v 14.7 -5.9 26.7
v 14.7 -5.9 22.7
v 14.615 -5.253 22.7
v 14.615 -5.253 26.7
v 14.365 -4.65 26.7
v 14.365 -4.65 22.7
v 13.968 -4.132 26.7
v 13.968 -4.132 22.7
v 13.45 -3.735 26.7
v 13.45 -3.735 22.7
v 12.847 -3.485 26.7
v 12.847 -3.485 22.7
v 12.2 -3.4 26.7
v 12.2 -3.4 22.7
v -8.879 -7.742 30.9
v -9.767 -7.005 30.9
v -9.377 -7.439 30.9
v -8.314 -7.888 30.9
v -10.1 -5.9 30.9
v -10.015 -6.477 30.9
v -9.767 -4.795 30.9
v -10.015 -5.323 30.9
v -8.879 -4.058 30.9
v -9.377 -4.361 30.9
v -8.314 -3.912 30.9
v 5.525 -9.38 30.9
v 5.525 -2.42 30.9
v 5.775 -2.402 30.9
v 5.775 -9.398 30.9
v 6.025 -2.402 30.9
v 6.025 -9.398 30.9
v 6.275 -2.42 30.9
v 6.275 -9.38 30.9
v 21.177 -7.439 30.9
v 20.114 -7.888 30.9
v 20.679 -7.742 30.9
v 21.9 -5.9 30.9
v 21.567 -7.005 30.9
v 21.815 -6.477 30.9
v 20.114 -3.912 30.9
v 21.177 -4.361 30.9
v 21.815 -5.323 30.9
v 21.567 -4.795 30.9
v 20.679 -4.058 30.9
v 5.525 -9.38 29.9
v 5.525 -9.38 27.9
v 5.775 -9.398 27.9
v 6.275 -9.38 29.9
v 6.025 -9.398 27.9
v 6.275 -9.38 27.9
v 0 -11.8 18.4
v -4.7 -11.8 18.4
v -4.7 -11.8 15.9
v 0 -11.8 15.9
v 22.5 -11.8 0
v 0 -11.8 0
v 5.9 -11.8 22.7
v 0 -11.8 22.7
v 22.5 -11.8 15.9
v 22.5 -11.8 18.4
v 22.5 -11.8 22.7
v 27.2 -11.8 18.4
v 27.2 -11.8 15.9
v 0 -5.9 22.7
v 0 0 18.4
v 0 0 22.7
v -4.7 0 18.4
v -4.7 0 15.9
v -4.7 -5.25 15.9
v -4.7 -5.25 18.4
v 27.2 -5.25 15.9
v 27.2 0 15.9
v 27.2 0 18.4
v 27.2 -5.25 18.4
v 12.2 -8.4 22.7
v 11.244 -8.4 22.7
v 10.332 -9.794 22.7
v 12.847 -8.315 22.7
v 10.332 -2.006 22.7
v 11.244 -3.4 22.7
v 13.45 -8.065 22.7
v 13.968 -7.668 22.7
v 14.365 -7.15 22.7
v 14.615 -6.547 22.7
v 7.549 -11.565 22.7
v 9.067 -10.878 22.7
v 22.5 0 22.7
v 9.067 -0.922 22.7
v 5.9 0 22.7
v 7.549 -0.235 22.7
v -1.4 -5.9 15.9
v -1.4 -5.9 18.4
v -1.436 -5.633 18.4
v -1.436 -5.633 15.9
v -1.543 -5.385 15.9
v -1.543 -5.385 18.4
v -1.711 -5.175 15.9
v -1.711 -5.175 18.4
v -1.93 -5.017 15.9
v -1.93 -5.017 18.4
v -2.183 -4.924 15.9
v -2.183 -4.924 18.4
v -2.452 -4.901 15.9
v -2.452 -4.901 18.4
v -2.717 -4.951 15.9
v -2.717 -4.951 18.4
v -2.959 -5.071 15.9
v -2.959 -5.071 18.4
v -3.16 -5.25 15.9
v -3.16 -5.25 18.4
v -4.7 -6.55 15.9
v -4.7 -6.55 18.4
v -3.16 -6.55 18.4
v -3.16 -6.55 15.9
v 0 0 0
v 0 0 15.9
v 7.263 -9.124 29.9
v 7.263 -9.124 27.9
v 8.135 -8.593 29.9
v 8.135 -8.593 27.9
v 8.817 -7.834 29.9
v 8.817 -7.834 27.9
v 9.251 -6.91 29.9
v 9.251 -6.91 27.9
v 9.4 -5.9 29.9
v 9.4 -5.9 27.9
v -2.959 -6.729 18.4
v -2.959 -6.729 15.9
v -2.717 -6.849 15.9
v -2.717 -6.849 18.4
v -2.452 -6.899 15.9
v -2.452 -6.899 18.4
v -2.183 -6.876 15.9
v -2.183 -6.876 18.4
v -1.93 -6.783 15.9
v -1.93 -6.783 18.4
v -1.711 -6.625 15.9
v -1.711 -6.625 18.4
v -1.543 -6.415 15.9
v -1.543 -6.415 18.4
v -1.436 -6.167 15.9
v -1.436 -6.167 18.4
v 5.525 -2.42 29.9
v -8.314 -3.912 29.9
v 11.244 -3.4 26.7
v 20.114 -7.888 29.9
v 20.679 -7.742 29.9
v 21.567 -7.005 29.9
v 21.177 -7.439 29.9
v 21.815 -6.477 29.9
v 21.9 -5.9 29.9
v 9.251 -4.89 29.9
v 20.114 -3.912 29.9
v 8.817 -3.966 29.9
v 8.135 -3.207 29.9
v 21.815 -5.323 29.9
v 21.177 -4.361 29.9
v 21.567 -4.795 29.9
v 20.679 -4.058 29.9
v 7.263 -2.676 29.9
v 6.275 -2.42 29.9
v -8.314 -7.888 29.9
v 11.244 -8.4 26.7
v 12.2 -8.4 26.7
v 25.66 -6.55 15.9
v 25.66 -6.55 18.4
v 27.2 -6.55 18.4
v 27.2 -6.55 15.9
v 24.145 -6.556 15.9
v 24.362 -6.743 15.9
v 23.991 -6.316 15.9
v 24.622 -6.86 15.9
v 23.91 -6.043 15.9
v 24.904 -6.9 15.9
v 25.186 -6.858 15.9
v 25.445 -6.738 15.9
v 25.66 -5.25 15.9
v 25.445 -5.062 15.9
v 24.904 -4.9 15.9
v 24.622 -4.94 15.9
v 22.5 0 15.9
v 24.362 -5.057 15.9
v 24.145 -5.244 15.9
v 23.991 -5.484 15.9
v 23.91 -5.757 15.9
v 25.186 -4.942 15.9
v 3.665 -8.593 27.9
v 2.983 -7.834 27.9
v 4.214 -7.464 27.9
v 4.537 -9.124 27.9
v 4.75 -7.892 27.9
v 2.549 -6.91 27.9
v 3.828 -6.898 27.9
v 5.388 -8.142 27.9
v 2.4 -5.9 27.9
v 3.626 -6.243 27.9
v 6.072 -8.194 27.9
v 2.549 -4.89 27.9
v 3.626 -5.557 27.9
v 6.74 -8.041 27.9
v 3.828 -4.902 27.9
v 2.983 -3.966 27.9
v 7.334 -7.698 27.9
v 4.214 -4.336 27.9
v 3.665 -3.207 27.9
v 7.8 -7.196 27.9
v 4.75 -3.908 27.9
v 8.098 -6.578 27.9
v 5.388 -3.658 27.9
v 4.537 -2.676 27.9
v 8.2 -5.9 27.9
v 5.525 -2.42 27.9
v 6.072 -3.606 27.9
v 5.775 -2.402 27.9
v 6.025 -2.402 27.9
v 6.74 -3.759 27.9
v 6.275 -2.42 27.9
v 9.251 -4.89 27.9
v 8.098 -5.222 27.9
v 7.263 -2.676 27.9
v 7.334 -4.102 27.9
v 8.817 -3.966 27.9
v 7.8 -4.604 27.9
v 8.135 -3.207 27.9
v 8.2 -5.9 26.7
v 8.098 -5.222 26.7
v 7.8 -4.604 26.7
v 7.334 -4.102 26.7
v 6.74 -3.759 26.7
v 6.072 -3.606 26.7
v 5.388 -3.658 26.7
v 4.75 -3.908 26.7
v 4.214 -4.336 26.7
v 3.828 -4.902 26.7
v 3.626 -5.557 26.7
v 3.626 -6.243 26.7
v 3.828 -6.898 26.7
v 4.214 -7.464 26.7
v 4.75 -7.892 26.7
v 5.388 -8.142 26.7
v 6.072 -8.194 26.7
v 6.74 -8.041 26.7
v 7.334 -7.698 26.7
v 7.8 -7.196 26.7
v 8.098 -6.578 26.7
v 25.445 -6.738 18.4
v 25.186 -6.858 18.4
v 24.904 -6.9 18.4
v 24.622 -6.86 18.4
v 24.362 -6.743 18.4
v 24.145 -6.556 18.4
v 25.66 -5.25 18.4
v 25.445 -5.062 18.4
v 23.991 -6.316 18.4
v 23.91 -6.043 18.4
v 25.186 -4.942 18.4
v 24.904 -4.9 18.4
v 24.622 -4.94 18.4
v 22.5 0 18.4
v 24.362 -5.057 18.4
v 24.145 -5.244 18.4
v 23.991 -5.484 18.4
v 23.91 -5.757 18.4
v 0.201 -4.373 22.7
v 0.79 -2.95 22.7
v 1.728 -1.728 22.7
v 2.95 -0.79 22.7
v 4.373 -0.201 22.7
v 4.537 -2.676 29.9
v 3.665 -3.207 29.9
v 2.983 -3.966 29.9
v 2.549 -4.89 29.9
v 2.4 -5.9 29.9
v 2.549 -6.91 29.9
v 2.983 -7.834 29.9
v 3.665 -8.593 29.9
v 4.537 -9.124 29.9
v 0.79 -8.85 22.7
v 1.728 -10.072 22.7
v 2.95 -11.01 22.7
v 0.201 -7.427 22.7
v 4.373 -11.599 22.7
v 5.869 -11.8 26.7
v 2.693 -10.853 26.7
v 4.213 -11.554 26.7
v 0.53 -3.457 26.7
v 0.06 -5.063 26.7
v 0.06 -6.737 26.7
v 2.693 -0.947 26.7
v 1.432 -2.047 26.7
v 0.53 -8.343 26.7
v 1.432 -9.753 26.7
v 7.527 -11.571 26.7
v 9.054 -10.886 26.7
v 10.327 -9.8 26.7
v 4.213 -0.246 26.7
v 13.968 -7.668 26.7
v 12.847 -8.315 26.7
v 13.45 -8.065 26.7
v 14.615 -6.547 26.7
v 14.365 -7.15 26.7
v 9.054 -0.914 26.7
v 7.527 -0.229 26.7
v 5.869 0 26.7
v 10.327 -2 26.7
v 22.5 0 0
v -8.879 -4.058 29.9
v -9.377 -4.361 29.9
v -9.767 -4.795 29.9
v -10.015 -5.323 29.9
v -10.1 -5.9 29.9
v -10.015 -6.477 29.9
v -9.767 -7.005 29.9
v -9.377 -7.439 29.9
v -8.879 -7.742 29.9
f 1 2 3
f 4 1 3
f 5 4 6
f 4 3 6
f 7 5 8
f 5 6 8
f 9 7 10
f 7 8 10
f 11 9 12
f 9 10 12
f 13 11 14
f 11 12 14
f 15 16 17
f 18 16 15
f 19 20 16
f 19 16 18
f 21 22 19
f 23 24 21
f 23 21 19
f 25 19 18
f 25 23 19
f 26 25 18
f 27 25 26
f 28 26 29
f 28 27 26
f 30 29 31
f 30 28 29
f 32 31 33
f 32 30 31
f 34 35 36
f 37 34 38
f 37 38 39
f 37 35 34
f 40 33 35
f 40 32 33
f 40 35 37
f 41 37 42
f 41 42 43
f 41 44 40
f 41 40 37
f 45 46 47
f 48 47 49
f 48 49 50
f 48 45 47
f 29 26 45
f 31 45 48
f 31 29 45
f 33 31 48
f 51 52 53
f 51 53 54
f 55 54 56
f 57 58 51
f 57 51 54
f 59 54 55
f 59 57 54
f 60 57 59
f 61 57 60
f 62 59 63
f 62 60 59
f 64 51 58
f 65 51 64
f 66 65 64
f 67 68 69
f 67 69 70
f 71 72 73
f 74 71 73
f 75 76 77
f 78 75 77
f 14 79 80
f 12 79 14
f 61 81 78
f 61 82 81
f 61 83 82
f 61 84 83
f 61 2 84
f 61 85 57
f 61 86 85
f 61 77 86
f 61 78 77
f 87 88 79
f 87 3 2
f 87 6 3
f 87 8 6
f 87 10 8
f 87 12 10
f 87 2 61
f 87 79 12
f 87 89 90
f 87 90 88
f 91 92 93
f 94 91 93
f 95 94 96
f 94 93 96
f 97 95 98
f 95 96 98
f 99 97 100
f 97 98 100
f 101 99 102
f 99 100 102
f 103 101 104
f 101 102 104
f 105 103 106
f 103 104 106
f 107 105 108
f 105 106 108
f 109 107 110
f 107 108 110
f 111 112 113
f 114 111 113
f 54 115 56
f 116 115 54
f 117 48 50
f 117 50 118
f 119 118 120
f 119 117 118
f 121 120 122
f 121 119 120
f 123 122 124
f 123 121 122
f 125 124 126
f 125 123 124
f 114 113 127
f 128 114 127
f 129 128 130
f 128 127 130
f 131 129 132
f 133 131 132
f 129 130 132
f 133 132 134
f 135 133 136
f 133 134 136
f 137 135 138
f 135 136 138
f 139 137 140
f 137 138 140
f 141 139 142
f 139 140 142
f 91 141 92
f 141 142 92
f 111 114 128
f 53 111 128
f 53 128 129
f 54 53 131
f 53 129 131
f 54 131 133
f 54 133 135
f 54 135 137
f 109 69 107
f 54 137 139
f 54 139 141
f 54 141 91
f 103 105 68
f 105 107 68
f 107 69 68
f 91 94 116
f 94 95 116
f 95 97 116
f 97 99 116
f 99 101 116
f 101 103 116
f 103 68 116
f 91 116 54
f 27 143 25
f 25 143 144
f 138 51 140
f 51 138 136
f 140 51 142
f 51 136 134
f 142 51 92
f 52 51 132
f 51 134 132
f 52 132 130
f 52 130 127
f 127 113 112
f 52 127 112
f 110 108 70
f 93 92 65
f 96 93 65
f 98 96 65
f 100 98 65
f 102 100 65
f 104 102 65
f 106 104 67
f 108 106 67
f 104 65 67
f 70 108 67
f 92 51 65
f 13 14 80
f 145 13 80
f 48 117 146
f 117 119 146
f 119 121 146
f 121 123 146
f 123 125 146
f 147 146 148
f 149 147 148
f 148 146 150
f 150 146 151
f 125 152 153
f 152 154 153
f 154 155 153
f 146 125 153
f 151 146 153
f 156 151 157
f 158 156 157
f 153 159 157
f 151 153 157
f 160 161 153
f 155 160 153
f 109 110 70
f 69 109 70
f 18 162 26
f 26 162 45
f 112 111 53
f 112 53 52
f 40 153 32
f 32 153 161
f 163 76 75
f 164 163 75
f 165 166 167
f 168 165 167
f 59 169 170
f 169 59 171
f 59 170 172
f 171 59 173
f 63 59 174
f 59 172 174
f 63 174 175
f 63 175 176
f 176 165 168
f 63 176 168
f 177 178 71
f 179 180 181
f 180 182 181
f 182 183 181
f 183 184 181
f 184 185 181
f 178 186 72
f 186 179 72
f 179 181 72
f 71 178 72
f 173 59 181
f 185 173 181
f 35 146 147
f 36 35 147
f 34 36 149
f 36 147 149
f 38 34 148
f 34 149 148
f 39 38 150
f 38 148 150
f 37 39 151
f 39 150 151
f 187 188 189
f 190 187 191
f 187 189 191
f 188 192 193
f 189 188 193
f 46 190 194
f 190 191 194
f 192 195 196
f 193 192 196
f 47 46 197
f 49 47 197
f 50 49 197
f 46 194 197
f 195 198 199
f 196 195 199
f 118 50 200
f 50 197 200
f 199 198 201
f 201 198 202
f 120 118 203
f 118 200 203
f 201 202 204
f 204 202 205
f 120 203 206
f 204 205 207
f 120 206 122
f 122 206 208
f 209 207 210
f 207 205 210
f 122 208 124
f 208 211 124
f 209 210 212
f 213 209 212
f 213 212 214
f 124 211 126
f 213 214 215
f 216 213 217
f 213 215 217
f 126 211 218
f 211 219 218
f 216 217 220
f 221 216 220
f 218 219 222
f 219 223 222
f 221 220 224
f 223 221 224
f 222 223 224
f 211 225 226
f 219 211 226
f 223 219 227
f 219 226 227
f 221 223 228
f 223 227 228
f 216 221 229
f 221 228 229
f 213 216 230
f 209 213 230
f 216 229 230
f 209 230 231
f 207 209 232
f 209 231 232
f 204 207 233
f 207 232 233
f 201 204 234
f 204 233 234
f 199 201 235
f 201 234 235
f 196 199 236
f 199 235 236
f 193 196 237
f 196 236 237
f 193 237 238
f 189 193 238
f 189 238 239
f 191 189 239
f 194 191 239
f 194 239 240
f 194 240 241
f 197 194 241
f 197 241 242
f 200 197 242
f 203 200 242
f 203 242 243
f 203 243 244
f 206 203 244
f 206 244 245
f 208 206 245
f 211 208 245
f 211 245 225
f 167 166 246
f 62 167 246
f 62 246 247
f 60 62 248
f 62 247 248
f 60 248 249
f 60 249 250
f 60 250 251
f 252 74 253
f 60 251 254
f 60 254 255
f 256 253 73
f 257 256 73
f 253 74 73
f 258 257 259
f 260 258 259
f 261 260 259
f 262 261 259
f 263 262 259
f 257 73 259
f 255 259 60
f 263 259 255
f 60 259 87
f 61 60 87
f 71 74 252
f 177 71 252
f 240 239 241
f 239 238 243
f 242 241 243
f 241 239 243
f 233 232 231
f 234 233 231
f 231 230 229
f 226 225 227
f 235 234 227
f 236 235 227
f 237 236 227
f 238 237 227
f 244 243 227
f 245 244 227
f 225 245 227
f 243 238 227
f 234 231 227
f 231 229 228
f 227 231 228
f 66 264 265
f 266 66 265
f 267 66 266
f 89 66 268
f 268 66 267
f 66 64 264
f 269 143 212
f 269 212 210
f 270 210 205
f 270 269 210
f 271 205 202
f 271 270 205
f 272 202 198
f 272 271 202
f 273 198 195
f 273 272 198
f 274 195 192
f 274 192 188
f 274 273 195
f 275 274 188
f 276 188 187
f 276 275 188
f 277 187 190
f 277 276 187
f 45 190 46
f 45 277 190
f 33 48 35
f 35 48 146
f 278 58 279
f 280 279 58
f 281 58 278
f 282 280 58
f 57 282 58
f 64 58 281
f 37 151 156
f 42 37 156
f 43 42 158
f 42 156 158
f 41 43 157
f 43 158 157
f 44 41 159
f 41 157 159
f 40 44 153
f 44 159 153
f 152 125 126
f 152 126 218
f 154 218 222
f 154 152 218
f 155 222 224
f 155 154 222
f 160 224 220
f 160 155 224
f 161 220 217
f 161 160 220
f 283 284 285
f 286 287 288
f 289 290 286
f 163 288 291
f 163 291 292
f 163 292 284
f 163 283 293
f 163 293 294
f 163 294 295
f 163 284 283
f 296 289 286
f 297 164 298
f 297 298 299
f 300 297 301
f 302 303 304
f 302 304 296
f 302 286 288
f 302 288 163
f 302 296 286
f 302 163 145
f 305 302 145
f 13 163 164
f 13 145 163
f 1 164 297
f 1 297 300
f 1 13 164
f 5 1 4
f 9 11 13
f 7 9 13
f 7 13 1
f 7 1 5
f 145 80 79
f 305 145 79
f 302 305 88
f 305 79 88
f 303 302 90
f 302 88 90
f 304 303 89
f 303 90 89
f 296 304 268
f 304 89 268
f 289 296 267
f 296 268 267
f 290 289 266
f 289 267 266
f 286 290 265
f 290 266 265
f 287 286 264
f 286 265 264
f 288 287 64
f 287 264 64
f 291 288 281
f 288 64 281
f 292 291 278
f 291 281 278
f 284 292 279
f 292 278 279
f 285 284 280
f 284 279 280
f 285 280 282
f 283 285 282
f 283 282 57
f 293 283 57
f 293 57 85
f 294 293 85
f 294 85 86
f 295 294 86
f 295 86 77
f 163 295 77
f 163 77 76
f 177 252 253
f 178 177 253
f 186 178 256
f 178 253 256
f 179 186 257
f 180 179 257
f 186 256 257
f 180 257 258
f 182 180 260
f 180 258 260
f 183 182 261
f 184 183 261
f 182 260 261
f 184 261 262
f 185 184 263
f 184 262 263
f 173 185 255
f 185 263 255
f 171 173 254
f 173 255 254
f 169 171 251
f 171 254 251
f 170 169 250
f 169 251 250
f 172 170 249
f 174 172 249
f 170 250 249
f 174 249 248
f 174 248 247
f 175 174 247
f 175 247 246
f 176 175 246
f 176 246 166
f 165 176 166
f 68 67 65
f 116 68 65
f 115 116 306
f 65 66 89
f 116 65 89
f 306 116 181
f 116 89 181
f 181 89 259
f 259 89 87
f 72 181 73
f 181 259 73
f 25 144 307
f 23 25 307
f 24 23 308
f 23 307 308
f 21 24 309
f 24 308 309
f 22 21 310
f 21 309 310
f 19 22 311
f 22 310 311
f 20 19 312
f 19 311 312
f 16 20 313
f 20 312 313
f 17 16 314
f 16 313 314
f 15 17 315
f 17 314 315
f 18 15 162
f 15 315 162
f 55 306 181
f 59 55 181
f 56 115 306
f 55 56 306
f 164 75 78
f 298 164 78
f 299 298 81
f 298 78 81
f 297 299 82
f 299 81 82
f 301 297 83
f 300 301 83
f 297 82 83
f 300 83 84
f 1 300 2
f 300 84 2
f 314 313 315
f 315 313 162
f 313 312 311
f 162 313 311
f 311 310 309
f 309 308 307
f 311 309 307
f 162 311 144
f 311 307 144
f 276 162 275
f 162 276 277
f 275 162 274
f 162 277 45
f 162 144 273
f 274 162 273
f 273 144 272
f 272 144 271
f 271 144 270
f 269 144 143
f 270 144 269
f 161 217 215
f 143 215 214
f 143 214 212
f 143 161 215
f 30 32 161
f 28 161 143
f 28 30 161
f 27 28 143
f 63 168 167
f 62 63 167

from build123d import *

# Parameters (mm, degrees)
F0_W      = 22.5
F0_H      = 15.9
F0_W_2    = 4.7
F0_H_2    = 2.5
F0_H_3    = 4.3
F1_DEPTH  = 11.8
F3_DEPTH  = 4
F5_DEPTH  = 18.401
F6_R      = 2.3
F7_DEPTH  = 3.2
F9_DEPTH  = 1
F8_R      = 2.3
F10_DEPTH = 2


with BuildPart() as f1:
    # F0 (on Front) → F1 (new body)
    with BuildSketch(Plane.XZ):
        with Locations((11.25, 7.95)):
            Rectangle(F0_W, F0_H)
        with Locations((-2.35, 17.15)):
            Rectangle(F0_W_2, F0_H_2)
        with Locations((11.25, 17.15)):
            Rectangle(F0_W, F0_H_2)
        with Locations((24.85, 17.15)):
            Rectangle(F0_W_2, F0_H_2)
        with Locations((11.25, 20.55)):
            Rectangle(F0_W, F0_H_3)
    extrude(amount=F1_DEPTH)

    # F2 (on face) → F3 (join)
    with BuildSketch(Plane.XY.offset(22.7)):
        with BuildLine():
            ThreePointArc((11.3166666667, -3.5612562726), (11.281015269, -3.4803564983), (11.2441556864, -3.4))
            ThreePointArc((11.2441556864, -3.4), (0, -5.9), (11.2441556864, -8.4))
            ThreePointArc((11.2441556864, -8.4), (11.281015269, -8.3196435017), (11.3166666667, -8.2387437274))
            ThreePointArc((11.3166666667, -8.2387437274), (9.7, -5.9), (11.3166666667, -3.5612562726))
        make_face()
        with BuildLine():
            Line((12.2, -3.4), (11.2441556864, -3.4))
            ThreePointArc((11.2441556864, -3.4), (11.281015269, -3.4803564983), (11.3166666667, -3.5612562726))
            ThreePointArc((11.3166666667, -3.5612562726), (11.7510341429, -3.4406444626), (12.2, -3.4))
        make_face()
        with BuildLine():
            ThreePointArc((11.3166666667, -8.2387437274), (11.281015269, -8.3196435017), (11.2441556864, -8.4))
            Line((11.2441556864, -8.4), (12.2, -8.4))
            ThreePointArc((12.2, -8.4), (11.7510341429, -8.3593555374), (11.3166666667, -8.2387437274))
        make_face()
        with BuildLine():
            ThreePointArc((12.2, -3.4), (11.7510341429, -3.4406444626), (11.3166666667, -3.5612562726))
            ThreePointArc((11.3166666667, -3.5612562726), (11.6779033106, -4.7059173675), (11.8, -5.9))
            ThreePointArc((11.8, -5.9), (11.6779033106, -7.0940826325), (11.3166666667, -8.2387437274))
            ThreePointArc((11.3166666667, -8.2387437274), (11.7510341429, -8.3593555374), (12.2, -8.4))
            ThreePointArc((12.2, -8.4), (13.967766953, -7.667766953), (14.7, -5.9))
            ThreePointArc((14.7, -5.9), (13.967766953, -4.132233047), (12.2, -3.4))
        make_face()
        with BuildLine():
            ThreePointArc((11.3166666667, -8.2387437274), (11.6779033106, -7.0940826325), (11.8, -5.9))
            ThreePointArc((11.8, -5.9), (11.6779033106, -4.7059173675), (11.3166666667, -3.5612562726))
            ThreePointArc((11.3166666667, -3.5612562726), (9.7, -5.9), (11.3166666667, -8.2387437274))
        make_face()
    extrude(amount=F3_DEPTH)

    # F4 (on face) → F5 (cut, through all)
    with BuildSketch(Plane.XY.offset(18.4)):
        with BuildLine():
            ThreePointArc((-3.1599342077, -6.55), (-2.0535423602, -6.8380656181), (-1.4, -5.9))
            ThreePointArc((-1.4, -5.9), (-2.0535423602, -4.9619343819), (-3.1599342077, -5.25))
            Line((-3.1599342077, -5.25), (-2.4, -5.25))
            Line((-2.4, -5.25), (-2.4, -6.55))
            Line((-2.4, -6.55), (-3.1599342077, -6.55))
        make_face()
        with BuildLine():
            Line((-2.4, -5.25), (-3.1599342077, -5.25))
            ThreePointArc((-3.1599342077, -5.25), (-3.4, -5.9), (-3.1599342077, -6.55))
            Line((-3.1599342077, -6.55), (-2.4, -6.55))
            Line((-2.4, -6.55), (-2.4, -5.25))
        make_face()
        with BuildLine():
            ThreePointArc((-3.1599342077, -6.55), (-3.4, -5.9), (-3.1599342077, -5.25))
            Line((-3.1599342077, -5.25), (-7, -5.25))
            Line((-7, -5.25), (-7, -6.55))
            Line((-7, -6.55), (-3.1599342077, -6.55))
        make_face()
        with BuildLine():
            ThreePointArc((25.6599342077, -6.55), (25.8380656181, -6.2464576398), (25.9, -5.9))
            ThreePointArc((25.9, -5.9), (25.8380656181, -5.5535423602), (25.6599342077, -5.25))
            Line((25.6599342077, -5.25), (24.9, -5.25))
            Line((24.9, -5.25), (24.9, -6.55))
            Line((24.9, -6.55), (25.6599342077, -6.55))
        make_face()
        with BuildLine():
            ThreePointArc((25.6599342077, -5.25), (25.8380656181, -5.5535423602), (25.9, -5.9))
            ThreePointArc((25.9, -5.9), (25.8380656181, -6.2464576398), (25.6599342077, -6.55))
            Line((25.6599342077, -6.55), (29.5482767582, -6.55))
            Line((29.5482767582, -6.55), (29.5482767582, -5.25))
            Line((29.5482767582, -5.25), (25.6599342077, -5.25))
        make_face()
        with BuildLine():
            Line((24.9, -5.25), (25.6599342077, -5.25))
            ThreePointArc((25.6599342077, -5.25), (23.9, -5.9), (25.6599342077, -6.55))
            Line((25.6599342077, -6.55), (24.9, -6.55))
            Line((24.9, -6.55), (24.9, -5.25))
        make_face()
    extrude(amount=-F5_DEPTH, mode=Mode.SUBTRACT)


with BuildPart() as f7:
    # F6 (on face) → F7 (new body)
    with BuildSketch(Plane.XY.offset(26.7)):
        with Locations((5.9, -5.9)):
            Circle(F6_R)
    extrude(amount=F7_DEPTH)

    # F8 (on face) → F9 (join)
    with BuildSketch(Plane.XY.offset(29.9)):
        with BuildLine():
            ThreePointArc((6.275, -9.3798527268), (8.504083332, -8.2385358667), (9.4, -5.9))
            ThreePointArc((9.4, -5.9), (8.504083332, -3.5614641333), (6.275, -2.4201472732))
            ThreePointArc((6.275, -2.4201472732), (5.9, -2.4), (5.525, -2.4201472732))
            ThreePointArc((5.525, -2.4201472732), (2.4, -5.9), (5.525, -9.3798527268))
            ThreePointArc((5.525, -9.3798527268), (5.9, -9.4), (6.275, -9.3798527268))
        make_face()
        with BuildLine():
            ThreePointArc((6.275, -2.4201472732), (8.504083332, -3.5614641333), (9.4, -5.9))
            ThreePointArc((9.4, -5.9), (8.504083332, -8.2385358667), (6.275, -9.3798527268))
            Line((6.275, -9.3798527268), (20.1142857143, -7.8884872724))
            ThreePointArc((20.1142857143, -7.8884872724), (17.9, -5.9), (20.1142857143, -3.9115127276))
            Line((20.1142857143, -3.9115127276), (6.275, -2.4201472732))
        make_face()
        with BuildLine():
            ThreePointArc((5.525, -9.3798527268), (2.4, -5.9), (5.525, -2.4201472732))
            Line((5.525, -2.4201472732), (-8.3142857143, -3.9115127276))
            ThreePointArc((-8.3142857143, -3.9115127276), (-6.7636937904, -4.4119523817), (-6.1, -5.9))
            ThreePointArc((-6.1, -5.9), (-6.7636937904, -7.3880476183), (-8.3142857143, -7.8884872724))
            Line((-8.3142857143, -7.8884872724), (5.525, -9.3798527268))
        make_face()
        with BuildLine():
            ThreePointArc((21.9, -5.9), (21.3880476183, -4.5636937904), (20.1142857143, -3.9115127276))
            ThreePointArc((20.1142857143, -3.9115127276), (17.9, -5.9), (20.1142857143, -7.8884872724))
            ThreePointArc((20.1142857143, -7.8884872724), (21.3880476183, -7.2363062096), (21.9, -5.9))
        make_face()
        with BuildLine():
            ThreePointArc((-6.1, -5.9), (-6.7636937904, -4.4119523817), (-8.3142857143, -3.9115127276))
            ThreePointArc((-8.3142857143, -3.9115127276), (-10.1, -5.9), (-8.3142857143, -7.8884872724))
            ThreePointArc((-8.3142857143, -7.8884872724), (-6.7636937904, -7.3880476183), (-6.1, -5.9))
        make_face()
    extrude(amount=F9_DEPTH)

    # F8 (on face) → F10 (join)
    with BuildSketch(Plane.XY.offset(29.9)):
        with BuildLine():
            ThreePointArc((6.275, -9.3798527268), (8.504083332, -8.2385358667), (9.4, -5.9))
            ThreePointArc((9.4, -5.9), (8.504083332, -3.5614641333), (6.275, -2.4201472732))
            ThreePointArc((6.275, -2.4201472732), (5.9, -2.4), (5.525, -2.4201472732))
            ThreePointArc((5.525, -2.4201472732), (2.4, -5.9), (5.525, -9.3798527268))
            ThreePointArc((5.525, -9.3798527268), (5.9, -9.4), (6.275, -9.3798527268))
        make_face()
        with Locations((5.9, -5.9)):
            Circle(F8_R, mode=Mode.SUBTRACT)
    extrude(amount=-F10_DEPTH)


solid = Compound([f1.part, f7.part])
